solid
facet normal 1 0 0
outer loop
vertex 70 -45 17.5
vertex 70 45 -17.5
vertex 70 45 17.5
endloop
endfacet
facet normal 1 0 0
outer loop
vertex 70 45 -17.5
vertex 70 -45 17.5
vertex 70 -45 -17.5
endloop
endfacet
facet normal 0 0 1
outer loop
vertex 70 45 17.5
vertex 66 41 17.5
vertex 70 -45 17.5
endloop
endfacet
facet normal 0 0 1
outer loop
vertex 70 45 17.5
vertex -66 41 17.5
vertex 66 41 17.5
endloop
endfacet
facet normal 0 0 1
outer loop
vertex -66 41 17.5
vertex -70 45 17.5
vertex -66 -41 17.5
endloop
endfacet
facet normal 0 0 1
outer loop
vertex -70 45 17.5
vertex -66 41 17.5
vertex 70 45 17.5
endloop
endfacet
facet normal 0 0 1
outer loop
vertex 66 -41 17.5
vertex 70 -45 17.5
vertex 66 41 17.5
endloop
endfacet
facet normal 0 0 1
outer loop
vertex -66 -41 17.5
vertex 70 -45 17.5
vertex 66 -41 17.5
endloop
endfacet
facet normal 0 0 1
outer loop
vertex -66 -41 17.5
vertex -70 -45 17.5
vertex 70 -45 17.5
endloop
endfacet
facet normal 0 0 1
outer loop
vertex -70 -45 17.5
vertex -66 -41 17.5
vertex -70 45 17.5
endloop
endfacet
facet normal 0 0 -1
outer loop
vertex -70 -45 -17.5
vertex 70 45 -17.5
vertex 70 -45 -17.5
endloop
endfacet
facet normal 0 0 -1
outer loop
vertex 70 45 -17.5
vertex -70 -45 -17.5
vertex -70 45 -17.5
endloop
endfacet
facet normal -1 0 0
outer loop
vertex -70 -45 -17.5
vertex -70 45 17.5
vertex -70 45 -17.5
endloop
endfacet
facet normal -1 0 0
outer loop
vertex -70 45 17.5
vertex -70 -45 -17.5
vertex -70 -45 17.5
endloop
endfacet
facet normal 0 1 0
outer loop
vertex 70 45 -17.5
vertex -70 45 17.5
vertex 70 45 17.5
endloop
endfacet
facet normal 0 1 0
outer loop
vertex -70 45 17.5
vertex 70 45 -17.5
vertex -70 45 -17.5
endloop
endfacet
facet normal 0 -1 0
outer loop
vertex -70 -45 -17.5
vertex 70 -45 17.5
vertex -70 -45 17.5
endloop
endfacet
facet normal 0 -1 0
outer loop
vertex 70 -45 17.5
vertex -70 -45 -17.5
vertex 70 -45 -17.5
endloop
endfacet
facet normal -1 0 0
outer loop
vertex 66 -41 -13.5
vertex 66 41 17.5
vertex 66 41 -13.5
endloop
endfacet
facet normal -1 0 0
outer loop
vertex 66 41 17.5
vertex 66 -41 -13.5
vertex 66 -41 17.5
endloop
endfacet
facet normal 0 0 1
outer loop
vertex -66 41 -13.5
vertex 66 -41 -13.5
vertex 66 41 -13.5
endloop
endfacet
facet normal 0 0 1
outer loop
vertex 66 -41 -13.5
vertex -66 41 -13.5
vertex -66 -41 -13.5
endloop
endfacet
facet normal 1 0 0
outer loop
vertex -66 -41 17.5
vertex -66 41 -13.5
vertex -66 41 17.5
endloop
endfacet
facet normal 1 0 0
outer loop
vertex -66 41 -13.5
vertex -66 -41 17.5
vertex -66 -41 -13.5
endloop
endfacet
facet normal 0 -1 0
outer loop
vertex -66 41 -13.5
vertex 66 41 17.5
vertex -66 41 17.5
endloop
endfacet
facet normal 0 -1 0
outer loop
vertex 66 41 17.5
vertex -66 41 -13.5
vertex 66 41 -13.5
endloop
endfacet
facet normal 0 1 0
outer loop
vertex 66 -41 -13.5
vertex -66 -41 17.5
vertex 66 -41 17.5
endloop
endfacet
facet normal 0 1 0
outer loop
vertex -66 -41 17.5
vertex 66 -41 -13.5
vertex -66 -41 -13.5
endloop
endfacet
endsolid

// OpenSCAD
// ========================================
// a 140 x 90 x 35 mm enclosure with 4 mm wall thickness
// NeuroCAD canonical IR; dimensions are millimetres
// ========================================
$fn = 48;

difference() {
  cube(size=[140, 90, 35], center=true);
  translate([0, 0, 2.1]) {
    cube(size=[132, 82, 31.2], center=true);
  }
}
